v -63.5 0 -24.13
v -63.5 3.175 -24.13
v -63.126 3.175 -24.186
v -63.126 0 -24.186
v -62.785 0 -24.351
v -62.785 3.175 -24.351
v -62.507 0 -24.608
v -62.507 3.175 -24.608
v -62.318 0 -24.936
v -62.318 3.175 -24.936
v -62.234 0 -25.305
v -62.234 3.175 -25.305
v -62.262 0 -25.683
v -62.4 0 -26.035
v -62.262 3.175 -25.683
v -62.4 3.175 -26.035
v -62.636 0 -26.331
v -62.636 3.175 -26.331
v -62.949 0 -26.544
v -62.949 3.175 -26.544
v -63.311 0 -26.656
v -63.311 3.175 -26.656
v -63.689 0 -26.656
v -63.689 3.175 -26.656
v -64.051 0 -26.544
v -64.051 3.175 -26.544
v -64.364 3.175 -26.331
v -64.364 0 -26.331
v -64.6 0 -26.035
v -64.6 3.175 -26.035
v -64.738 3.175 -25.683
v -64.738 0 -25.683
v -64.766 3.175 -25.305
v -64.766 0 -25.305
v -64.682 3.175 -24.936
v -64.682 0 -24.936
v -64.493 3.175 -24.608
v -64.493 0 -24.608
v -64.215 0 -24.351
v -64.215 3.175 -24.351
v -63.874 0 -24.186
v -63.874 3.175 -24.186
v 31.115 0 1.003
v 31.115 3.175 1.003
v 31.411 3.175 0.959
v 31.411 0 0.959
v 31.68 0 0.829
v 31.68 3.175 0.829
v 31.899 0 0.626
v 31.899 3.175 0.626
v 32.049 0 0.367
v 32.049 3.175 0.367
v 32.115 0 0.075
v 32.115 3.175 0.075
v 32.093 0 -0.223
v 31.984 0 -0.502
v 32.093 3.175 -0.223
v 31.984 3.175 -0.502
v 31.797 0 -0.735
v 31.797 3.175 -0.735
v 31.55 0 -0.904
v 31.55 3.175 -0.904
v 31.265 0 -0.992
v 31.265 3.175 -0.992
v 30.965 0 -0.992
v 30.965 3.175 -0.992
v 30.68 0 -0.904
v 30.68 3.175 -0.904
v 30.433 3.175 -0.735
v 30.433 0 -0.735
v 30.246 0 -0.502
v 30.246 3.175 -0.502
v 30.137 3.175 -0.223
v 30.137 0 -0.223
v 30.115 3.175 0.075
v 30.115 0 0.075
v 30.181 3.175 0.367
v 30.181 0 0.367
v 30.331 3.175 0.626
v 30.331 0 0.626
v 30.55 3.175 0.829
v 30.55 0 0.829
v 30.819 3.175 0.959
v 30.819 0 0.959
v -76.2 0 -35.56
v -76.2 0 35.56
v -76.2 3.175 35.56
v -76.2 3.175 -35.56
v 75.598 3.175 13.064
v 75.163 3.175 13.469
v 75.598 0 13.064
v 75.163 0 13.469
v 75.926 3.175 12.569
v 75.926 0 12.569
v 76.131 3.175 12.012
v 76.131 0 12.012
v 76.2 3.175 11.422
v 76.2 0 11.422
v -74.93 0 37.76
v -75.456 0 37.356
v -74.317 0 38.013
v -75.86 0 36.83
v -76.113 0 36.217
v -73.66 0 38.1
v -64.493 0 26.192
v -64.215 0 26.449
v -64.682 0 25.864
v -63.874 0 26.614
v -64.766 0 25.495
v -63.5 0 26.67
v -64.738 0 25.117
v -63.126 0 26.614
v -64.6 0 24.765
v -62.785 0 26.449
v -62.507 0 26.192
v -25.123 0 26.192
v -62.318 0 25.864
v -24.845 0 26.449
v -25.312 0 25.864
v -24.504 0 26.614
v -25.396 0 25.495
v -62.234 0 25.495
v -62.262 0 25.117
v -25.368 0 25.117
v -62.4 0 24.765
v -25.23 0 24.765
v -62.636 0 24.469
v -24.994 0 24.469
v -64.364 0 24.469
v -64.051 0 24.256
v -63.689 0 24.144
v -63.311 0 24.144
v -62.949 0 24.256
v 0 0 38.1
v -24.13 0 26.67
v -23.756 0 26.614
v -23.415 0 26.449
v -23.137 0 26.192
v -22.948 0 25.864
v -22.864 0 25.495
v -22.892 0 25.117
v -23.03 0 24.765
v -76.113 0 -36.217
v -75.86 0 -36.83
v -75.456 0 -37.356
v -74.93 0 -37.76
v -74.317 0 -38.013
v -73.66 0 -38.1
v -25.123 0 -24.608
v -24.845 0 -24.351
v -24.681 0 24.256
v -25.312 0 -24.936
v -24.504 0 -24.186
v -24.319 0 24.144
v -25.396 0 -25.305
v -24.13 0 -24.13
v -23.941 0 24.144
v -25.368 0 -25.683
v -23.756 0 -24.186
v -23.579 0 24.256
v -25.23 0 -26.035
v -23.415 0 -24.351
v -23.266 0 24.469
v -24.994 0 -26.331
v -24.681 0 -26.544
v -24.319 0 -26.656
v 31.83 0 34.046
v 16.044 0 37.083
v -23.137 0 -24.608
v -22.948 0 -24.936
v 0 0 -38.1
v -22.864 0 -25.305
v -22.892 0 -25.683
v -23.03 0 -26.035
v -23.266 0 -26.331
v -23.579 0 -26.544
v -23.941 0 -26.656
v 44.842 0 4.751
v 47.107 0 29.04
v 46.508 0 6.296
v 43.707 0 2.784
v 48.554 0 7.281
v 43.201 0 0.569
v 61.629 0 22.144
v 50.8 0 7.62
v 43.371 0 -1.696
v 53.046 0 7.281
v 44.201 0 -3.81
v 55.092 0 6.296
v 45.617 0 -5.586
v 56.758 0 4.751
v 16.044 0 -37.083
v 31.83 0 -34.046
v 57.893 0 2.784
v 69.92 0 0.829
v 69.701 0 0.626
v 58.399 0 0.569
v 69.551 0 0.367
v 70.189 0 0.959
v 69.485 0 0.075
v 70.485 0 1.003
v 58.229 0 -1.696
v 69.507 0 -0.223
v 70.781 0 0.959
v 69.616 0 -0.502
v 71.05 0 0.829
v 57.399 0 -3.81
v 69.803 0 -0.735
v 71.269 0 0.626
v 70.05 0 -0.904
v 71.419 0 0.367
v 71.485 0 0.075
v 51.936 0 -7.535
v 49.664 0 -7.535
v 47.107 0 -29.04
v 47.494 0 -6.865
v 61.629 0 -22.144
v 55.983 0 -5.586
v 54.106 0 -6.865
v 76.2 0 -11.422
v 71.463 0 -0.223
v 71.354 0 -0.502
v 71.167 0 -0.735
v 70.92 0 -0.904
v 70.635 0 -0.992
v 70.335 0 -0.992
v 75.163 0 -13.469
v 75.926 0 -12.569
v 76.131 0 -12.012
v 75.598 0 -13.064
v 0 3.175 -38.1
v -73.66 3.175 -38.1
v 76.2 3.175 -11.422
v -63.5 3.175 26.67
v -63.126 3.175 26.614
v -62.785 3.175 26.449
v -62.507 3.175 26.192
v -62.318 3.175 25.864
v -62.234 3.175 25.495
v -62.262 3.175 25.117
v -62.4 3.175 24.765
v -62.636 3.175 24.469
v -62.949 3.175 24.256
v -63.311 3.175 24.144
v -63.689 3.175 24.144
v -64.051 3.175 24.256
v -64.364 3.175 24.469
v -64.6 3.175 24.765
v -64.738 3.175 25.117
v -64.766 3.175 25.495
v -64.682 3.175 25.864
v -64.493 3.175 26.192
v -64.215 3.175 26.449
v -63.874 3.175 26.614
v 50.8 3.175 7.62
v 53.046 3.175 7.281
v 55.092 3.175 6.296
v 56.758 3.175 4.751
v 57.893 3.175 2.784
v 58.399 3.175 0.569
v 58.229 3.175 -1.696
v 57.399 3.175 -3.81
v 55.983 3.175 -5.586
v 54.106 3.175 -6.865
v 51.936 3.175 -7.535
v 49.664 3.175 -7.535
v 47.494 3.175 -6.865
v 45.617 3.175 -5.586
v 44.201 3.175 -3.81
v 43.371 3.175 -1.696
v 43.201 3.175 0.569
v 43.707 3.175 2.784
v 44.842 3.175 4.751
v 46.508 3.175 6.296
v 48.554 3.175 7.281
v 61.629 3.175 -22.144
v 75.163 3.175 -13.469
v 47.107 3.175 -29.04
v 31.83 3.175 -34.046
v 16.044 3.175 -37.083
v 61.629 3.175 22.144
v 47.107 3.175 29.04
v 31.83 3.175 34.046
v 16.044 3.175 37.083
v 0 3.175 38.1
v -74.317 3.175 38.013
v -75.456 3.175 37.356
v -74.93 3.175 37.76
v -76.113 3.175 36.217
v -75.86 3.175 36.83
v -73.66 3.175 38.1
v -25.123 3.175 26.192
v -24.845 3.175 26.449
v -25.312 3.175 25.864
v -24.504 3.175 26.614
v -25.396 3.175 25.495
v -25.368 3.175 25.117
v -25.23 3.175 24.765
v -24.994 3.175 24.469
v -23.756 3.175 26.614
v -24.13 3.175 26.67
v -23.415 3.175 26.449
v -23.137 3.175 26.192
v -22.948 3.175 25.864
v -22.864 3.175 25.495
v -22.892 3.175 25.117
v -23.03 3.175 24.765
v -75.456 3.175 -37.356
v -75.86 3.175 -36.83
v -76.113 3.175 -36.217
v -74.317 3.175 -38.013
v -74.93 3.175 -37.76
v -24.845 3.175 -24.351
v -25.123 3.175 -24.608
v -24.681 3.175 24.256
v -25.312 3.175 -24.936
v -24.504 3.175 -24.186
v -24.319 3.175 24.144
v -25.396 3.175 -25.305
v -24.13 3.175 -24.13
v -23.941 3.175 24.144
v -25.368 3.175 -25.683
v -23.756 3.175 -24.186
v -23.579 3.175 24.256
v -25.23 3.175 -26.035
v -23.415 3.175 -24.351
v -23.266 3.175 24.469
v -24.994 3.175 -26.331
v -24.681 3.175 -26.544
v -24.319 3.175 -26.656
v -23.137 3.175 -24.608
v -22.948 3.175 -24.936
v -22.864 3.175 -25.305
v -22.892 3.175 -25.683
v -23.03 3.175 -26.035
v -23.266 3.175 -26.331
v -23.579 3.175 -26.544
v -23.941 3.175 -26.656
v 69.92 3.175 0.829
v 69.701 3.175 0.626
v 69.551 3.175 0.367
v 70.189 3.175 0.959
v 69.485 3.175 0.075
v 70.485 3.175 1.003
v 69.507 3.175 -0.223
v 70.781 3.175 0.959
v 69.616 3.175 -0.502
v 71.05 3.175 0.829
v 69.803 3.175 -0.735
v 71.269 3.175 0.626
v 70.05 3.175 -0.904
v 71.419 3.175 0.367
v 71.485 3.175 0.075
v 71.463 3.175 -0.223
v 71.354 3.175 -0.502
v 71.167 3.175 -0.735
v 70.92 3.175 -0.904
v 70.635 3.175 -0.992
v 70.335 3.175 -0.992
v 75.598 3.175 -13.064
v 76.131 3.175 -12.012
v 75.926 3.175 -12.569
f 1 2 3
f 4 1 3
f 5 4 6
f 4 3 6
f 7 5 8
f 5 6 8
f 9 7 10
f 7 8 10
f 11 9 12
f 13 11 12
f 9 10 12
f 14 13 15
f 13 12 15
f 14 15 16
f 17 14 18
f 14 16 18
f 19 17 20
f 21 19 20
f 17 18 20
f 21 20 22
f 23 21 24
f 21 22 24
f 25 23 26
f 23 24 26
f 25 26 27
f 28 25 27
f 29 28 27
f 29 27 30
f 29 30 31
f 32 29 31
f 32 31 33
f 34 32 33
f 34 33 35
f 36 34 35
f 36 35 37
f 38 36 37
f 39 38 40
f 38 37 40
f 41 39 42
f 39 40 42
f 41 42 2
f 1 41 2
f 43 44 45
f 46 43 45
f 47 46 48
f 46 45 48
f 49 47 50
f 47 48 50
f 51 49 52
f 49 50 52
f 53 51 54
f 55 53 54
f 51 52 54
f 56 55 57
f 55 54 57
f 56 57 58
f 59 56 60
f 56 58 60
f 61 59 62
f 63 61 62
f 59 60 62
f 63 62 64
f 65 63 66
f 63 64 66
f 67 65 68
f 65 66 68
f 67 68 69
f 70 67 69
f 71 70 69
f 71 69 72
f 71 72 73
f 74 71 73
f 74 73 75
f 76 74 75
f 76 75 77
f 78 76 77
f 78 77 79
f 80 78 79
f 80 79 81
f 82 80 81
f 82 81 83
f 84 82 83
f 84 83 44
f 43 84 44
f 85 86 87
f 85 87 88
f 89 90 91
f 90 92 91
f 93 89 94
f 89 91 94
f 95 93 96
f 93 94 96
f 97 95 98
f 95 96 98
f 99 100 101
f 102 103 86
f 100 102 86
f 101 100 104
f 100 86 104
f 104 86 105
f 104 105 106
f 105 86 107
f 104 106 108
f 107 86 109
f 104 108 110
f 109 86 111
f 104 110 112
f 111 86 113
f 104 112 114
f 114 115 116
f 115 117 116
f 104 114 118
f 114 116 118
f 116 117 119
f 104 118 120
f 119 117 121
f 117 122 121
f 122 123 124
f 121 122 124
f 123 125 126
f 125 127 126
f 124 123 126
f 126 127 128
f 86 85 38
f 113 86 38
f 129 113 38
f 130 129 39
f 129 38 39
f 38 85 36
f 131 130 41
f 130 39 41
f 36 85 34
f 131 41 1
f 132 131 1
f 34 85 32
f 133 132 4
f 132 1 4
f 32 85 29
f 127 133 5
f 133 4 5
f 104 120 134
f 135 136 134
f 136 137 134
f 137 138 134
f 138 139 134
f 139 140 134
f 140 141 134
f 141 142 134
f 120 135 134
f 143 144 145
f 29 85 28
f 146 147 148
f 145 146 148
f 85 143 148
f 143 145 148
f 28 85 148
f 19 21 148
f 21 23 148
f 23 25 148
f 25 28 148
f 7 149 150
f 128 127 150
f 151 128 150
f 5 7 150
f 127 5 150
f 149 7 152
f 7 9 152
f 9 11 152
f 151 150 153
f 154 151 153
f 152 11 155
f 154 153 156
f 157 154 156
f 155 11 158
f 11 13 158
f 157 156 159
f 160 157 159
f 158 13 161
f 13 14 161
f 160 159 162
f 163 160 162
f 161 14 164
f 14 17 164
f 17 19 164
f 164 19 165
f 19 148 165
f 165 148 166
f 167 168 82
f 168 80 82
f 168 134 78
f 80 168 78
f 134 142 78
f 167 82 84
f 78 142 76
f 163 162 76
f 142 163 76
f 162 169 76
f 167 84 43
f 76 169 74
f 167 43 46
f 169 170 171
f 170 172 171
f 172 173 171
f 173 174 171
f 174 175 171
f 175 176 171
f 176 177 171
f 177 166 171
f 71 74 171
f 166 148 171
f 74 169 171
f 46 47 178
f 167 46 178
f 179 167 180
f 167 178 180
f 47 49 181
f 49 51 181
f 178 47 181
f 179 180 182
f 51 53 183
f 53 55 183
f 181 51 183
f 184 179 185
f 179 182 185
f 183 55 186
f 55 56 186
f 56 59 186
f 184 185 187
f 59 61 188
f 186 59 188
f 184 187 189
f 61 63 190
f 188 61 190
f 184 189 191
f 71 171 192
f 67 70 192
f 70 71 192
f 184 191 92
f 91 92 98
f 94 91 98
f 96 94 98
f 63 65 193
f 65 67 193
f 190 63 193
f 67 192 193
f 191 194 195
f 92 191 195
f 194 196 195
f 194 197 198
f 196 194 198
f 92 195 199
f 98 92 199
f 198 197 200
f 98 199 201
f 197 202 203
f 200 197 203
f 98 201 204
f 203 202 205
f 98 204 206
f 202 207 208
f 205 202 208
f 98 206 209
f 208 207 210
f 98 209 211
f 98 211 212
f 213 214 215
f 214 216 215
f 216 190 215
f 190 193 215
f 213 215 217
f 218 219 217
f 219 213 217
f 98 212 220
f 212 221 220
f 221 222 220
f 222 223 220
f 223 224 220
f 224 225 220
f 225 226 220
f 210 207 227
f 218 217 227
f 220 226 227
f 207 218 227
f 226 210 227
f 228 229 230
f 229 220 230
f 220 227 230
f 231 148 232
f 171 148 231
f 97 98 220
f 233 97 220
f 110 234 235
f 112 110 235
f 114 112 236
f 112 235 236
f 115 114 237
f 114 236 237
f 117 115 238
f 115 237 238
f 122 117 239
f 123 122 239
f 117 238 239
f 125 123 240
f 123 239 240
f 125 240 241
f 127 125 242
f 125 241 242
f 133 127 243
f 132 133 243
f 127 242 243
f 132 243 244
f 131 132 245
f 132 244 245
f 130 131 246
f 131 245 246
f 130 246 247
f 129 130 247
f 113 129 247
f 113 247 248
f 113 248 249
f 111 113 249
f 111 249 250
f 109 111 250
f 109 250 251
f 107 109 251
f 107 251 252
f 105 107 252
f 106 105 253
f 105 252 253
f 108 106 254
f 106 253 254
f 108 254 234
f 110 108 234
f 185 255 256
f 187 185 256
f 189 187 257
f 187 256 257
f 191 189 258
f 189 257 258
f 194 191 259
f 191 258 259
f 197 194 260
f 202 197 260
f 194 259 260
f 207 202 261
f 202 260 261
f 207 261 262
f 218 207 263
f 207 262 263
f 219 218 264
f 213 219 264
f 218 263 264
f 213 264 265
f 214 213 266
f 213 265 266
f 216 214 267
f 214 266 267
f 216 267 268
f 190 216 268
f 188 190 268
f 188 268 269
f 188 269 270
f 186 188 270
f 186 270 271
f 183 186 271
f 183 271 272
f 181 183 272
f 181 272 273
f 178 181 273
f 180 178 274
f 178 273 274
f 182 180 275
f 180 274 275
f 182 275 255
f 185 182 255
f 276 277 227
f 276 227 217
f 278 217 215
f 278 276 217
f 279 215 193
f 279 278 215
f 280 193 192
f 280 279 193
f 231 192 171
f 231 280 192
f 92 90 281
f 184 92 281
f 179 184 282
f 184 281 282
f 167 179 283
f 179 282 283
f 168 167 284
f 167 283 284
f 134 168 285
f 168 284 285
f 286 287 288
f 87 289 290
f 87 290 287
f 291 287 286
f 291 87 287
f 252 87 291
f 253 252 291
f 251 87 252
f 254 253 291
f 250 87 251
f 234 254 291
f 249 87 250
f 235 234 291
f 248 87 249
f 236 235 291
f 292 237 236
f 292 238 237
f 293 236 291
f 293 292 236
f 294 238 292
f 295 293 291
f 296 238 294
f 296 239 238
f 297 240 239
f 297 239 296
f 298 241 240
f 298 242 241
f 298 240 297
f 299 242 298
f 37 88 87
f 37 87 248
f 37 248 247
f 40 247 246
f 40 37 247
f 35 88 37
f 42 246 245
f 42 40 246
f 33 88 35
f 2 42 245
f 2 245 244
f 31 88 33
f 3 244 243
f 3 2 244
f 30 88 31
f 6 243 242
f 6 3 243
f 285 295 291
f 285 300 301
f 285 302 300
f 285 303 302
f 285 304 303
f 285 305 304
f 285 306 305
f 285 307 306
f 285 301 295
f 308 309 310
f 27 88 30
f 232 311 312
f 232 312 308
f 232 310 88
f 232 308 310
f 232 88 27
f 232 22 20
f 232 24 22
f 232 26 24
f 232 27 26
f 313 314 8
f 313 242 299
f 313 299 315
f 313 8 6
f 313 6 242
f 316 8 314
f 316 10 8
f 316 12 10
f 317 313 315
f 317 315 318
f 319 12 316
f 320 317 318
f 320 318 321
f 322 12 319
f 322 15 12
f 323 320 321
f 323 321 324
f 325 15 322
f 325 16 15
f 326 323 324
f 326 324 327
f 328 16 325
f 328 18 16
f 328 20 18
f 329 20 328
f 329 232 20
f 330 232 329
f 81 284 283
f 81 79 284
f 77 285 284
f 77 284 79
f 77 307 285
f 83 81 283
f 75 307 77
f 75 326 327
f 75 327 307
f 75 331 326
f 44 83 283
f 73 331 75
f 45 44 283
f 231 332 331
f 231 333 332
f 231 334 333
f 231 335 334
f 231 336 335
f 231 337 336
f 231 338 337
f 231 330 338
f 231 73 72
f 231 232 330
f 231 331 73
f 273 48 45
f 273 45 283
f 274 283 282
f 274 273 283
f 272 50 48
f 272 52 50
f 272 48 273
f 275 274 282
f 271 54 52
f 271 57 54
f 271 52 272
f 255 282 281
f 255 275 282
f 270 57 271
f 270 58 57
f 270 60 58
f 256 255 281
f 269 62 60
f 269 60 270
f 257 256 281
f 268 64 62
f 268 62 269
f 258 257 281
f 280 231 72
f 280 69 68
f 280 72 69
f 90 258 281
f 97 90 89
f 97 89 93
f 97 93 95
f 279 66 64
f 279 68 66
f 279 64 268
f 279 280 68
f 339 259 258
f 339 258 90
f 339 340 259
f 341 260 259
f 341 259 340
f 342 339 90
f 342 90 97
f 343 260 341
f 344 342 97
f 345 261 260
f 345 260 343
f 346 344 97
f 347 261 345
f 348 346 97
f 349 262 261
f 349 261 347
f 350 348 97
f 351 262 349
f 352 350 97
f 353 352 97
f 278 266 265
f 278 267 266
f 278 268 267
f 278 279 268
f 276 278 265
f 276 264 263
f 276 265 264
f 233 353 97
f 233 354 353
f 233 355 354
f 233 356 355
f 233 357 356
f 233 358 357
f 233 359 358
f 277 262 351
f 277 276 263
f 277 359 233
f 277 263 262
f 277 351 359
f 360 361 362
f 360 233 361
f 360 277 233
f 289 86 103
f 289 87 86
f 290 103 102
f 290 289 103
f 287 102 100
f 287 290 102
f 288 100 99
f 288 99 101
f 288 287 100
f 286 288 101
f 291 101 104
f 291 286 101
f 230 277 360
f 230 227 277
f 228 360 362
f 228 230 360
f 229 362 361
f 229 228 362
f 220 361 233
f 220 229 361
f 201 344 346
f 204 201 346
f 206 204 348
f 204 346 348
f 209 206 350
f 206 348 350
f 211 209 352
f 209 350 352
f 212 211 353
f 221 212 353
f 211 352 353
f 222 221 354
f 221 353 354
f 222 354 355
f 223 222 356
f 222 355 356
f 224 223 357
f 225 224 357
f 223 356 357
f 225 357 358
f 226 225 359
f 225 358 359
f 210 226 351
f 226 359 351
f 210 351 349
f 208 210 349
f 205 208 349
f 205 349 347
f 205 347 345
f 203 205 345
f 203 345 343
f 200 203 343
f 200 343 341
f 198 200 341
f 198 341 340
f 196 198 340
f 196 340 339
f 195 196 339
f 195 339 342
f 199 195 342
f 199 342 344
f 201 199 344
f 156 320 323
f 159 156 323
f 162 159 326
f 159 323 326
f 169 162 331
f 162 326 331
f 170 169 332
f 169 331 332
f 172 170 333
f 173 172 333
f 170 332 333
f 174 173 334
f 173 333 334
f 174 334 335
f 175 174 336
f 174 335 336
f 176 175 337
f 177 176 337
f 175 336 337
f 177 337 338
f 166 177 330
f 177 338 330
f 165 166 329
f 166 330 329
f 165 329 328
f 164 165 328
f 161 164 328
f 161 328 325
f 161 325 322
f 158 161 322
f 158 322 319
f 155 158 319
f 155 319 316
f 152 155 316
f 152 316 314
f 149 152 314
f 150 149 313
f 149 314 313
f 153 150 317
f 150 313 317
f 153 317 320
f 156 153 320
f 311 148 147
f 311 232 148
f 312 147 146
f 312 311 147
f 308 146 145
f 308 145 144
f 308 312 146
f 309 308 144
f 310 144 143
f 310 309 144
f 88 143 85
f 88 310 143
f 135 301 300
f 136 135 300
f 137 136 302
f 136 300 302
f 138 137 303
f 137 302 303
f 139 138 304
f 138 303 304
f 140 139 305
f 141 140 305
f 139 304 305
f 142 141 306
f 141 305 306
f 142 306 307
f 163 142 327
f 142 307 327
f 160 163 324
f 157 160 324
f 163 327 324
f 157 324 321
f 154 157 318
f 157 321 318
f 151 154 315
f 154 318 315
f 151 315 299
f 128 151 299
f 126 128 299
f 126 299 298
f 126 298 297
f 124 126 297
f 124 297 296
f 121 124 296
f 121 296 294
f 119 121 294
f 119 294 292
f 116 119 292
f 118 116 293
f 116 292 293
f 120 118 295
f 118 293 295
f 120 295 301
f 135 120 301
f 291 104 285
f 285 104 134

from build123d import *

# Parameters (mm, degrees)
SKETCH1_W           = 152.4
SKETCH1_H           = 76.2
BOSS_EXTRUDE1_DEPTH = 3.175
CUT_EXTRUDE1_DEPTH  = 3.175
FILLET2_R           = 2.54
FILLET3_R           = 2.54
SKETCH5_R           = 7.62
CUT_EXTRUDE2_DEPTH  = 3.175
SKETCH6_R           = 1.27
CUT_EXTRUDE3_DEPTH  = 3.175
SKETCH7_R           = 1.0033
CUT_EXTRUDE4_DEPTH  = 86.253332046


with BuildPart() as part:
    # Sketch1 → Boss-Extrude1 (new body)
    with BuildSketch(Plane(origin=(0, 0, 0), x_dir=(1, 0, 0), z_dir=(0, 1, 0))):
        Rectangle(SKETCH1_W, SKETCH1_H)
    extrude(amount=BOSS_EXTRUDE1_DEPTH)

    # Sketch4 → Cut-Extrude1 (cut)
    with BuildSketch(Plane(origin=(0, 3.175, 0), x_dir=(1, 0, 0), z_dir=(0, 1, 0))):
        with BuildLine():
            Line((0, 38.1), (76.2, 38.1))
            Line((76.2, 38.1), (76.2, 12.7))
            ThreePointArc((76.2, 12.7), (40.160926284, 31.582778852), (0, 38.1))
        make_face()
        with BuildLine():
            Line((76.2, -38.1), (76.2, -12.7))
            ThreePointArc((76.2, -12.7), (40.160926284, -31.582778852), (0, -38.1))
            Line((0, -38.1), (76.2, -38.1))
        make_face()
    extrude(amount=-CUT_EXTRUDE1_DEPTH, mode=Mode.SUBTRACT)

    # Fillet2
    fillet2_edges = [part.edges().sort_by_distance(p)[0] for p in [
        (76.2, 1.5875, -12.7),
        (76.2, 1.5875, 12.7),
    ]]
    fillet(fillet2_edges, radius=FILLET2_R)

    # Fillet3
    fillet3_edges = [part.edges().sort_by_distance(p)[0] for p in [
        (-76.2, 1.5875, -38.1),
        (-76.2, 1.5875, 38.1),
    ]]
    fillet(fillet3_edges, radius=FILLET3_R)

    # Sketch5 → Cut-Extrude2 (cut)
    with BuildSketch(Plane(origin=(0, 3.175, 0), x_dir=(1, 0, 0), z_dir=(0, 1, 0))):
        with Locations(Location((50.8, 0, 0), (0, 0, 270))):
            Circle(SKETCH5_R)
    extrude(amount=-CUT_EXTRUDE2_DEPTH, mode=Mode.SUBTRACT)

    # Sketch6 → Cut-Extrude3 (cut)
    with BuildSketch(Plane(origin=(0, 3.175, 0), x_dir=(1, 0, 0), z_dir=(0, 1, 0))):
        with Locations(Location((-63.5, 25.4, 0), (0, 0, 270))):
            Circle(SKETCH6_R)
        with Locations(Location((-63.5, -25.4, 0), (0, 0, 270))):
            Circle(SKETCH6_R)
        with Locations(Location((-24.13, 25.4, 0), (0, 0, 270))):
            Circle(SKETCH6_R)
        with Locations(Location((-24.13, -25.4, 0), (0, 0, 270))):
            Circle(SKETCH6_R)
    extrude(amount=-CUT_EXTRUDE3_DEPTH, mode=Mode.SUBTRACT)

    # Sketch7 → Cut-Extrude4 (cut, through all)
    with BuildSketch(Plane(origin=(0, 3.175, 0), x_dir=(1, 0, 0), z_dir=(0, 1, 0))):
        with Locations(Location((70.485, 0, 0), (0, 0, 270))):
            Circle(SKETCH7_R)
        with Locations(Location((31.115, 0, 0), (0, 0, 270))):
            Circle(SKETCH7_R)
    extrude(amount=-CUT_EXTRUDE4_DEPTH, mode=Mode.SUBTRACT)


solid = part.part
